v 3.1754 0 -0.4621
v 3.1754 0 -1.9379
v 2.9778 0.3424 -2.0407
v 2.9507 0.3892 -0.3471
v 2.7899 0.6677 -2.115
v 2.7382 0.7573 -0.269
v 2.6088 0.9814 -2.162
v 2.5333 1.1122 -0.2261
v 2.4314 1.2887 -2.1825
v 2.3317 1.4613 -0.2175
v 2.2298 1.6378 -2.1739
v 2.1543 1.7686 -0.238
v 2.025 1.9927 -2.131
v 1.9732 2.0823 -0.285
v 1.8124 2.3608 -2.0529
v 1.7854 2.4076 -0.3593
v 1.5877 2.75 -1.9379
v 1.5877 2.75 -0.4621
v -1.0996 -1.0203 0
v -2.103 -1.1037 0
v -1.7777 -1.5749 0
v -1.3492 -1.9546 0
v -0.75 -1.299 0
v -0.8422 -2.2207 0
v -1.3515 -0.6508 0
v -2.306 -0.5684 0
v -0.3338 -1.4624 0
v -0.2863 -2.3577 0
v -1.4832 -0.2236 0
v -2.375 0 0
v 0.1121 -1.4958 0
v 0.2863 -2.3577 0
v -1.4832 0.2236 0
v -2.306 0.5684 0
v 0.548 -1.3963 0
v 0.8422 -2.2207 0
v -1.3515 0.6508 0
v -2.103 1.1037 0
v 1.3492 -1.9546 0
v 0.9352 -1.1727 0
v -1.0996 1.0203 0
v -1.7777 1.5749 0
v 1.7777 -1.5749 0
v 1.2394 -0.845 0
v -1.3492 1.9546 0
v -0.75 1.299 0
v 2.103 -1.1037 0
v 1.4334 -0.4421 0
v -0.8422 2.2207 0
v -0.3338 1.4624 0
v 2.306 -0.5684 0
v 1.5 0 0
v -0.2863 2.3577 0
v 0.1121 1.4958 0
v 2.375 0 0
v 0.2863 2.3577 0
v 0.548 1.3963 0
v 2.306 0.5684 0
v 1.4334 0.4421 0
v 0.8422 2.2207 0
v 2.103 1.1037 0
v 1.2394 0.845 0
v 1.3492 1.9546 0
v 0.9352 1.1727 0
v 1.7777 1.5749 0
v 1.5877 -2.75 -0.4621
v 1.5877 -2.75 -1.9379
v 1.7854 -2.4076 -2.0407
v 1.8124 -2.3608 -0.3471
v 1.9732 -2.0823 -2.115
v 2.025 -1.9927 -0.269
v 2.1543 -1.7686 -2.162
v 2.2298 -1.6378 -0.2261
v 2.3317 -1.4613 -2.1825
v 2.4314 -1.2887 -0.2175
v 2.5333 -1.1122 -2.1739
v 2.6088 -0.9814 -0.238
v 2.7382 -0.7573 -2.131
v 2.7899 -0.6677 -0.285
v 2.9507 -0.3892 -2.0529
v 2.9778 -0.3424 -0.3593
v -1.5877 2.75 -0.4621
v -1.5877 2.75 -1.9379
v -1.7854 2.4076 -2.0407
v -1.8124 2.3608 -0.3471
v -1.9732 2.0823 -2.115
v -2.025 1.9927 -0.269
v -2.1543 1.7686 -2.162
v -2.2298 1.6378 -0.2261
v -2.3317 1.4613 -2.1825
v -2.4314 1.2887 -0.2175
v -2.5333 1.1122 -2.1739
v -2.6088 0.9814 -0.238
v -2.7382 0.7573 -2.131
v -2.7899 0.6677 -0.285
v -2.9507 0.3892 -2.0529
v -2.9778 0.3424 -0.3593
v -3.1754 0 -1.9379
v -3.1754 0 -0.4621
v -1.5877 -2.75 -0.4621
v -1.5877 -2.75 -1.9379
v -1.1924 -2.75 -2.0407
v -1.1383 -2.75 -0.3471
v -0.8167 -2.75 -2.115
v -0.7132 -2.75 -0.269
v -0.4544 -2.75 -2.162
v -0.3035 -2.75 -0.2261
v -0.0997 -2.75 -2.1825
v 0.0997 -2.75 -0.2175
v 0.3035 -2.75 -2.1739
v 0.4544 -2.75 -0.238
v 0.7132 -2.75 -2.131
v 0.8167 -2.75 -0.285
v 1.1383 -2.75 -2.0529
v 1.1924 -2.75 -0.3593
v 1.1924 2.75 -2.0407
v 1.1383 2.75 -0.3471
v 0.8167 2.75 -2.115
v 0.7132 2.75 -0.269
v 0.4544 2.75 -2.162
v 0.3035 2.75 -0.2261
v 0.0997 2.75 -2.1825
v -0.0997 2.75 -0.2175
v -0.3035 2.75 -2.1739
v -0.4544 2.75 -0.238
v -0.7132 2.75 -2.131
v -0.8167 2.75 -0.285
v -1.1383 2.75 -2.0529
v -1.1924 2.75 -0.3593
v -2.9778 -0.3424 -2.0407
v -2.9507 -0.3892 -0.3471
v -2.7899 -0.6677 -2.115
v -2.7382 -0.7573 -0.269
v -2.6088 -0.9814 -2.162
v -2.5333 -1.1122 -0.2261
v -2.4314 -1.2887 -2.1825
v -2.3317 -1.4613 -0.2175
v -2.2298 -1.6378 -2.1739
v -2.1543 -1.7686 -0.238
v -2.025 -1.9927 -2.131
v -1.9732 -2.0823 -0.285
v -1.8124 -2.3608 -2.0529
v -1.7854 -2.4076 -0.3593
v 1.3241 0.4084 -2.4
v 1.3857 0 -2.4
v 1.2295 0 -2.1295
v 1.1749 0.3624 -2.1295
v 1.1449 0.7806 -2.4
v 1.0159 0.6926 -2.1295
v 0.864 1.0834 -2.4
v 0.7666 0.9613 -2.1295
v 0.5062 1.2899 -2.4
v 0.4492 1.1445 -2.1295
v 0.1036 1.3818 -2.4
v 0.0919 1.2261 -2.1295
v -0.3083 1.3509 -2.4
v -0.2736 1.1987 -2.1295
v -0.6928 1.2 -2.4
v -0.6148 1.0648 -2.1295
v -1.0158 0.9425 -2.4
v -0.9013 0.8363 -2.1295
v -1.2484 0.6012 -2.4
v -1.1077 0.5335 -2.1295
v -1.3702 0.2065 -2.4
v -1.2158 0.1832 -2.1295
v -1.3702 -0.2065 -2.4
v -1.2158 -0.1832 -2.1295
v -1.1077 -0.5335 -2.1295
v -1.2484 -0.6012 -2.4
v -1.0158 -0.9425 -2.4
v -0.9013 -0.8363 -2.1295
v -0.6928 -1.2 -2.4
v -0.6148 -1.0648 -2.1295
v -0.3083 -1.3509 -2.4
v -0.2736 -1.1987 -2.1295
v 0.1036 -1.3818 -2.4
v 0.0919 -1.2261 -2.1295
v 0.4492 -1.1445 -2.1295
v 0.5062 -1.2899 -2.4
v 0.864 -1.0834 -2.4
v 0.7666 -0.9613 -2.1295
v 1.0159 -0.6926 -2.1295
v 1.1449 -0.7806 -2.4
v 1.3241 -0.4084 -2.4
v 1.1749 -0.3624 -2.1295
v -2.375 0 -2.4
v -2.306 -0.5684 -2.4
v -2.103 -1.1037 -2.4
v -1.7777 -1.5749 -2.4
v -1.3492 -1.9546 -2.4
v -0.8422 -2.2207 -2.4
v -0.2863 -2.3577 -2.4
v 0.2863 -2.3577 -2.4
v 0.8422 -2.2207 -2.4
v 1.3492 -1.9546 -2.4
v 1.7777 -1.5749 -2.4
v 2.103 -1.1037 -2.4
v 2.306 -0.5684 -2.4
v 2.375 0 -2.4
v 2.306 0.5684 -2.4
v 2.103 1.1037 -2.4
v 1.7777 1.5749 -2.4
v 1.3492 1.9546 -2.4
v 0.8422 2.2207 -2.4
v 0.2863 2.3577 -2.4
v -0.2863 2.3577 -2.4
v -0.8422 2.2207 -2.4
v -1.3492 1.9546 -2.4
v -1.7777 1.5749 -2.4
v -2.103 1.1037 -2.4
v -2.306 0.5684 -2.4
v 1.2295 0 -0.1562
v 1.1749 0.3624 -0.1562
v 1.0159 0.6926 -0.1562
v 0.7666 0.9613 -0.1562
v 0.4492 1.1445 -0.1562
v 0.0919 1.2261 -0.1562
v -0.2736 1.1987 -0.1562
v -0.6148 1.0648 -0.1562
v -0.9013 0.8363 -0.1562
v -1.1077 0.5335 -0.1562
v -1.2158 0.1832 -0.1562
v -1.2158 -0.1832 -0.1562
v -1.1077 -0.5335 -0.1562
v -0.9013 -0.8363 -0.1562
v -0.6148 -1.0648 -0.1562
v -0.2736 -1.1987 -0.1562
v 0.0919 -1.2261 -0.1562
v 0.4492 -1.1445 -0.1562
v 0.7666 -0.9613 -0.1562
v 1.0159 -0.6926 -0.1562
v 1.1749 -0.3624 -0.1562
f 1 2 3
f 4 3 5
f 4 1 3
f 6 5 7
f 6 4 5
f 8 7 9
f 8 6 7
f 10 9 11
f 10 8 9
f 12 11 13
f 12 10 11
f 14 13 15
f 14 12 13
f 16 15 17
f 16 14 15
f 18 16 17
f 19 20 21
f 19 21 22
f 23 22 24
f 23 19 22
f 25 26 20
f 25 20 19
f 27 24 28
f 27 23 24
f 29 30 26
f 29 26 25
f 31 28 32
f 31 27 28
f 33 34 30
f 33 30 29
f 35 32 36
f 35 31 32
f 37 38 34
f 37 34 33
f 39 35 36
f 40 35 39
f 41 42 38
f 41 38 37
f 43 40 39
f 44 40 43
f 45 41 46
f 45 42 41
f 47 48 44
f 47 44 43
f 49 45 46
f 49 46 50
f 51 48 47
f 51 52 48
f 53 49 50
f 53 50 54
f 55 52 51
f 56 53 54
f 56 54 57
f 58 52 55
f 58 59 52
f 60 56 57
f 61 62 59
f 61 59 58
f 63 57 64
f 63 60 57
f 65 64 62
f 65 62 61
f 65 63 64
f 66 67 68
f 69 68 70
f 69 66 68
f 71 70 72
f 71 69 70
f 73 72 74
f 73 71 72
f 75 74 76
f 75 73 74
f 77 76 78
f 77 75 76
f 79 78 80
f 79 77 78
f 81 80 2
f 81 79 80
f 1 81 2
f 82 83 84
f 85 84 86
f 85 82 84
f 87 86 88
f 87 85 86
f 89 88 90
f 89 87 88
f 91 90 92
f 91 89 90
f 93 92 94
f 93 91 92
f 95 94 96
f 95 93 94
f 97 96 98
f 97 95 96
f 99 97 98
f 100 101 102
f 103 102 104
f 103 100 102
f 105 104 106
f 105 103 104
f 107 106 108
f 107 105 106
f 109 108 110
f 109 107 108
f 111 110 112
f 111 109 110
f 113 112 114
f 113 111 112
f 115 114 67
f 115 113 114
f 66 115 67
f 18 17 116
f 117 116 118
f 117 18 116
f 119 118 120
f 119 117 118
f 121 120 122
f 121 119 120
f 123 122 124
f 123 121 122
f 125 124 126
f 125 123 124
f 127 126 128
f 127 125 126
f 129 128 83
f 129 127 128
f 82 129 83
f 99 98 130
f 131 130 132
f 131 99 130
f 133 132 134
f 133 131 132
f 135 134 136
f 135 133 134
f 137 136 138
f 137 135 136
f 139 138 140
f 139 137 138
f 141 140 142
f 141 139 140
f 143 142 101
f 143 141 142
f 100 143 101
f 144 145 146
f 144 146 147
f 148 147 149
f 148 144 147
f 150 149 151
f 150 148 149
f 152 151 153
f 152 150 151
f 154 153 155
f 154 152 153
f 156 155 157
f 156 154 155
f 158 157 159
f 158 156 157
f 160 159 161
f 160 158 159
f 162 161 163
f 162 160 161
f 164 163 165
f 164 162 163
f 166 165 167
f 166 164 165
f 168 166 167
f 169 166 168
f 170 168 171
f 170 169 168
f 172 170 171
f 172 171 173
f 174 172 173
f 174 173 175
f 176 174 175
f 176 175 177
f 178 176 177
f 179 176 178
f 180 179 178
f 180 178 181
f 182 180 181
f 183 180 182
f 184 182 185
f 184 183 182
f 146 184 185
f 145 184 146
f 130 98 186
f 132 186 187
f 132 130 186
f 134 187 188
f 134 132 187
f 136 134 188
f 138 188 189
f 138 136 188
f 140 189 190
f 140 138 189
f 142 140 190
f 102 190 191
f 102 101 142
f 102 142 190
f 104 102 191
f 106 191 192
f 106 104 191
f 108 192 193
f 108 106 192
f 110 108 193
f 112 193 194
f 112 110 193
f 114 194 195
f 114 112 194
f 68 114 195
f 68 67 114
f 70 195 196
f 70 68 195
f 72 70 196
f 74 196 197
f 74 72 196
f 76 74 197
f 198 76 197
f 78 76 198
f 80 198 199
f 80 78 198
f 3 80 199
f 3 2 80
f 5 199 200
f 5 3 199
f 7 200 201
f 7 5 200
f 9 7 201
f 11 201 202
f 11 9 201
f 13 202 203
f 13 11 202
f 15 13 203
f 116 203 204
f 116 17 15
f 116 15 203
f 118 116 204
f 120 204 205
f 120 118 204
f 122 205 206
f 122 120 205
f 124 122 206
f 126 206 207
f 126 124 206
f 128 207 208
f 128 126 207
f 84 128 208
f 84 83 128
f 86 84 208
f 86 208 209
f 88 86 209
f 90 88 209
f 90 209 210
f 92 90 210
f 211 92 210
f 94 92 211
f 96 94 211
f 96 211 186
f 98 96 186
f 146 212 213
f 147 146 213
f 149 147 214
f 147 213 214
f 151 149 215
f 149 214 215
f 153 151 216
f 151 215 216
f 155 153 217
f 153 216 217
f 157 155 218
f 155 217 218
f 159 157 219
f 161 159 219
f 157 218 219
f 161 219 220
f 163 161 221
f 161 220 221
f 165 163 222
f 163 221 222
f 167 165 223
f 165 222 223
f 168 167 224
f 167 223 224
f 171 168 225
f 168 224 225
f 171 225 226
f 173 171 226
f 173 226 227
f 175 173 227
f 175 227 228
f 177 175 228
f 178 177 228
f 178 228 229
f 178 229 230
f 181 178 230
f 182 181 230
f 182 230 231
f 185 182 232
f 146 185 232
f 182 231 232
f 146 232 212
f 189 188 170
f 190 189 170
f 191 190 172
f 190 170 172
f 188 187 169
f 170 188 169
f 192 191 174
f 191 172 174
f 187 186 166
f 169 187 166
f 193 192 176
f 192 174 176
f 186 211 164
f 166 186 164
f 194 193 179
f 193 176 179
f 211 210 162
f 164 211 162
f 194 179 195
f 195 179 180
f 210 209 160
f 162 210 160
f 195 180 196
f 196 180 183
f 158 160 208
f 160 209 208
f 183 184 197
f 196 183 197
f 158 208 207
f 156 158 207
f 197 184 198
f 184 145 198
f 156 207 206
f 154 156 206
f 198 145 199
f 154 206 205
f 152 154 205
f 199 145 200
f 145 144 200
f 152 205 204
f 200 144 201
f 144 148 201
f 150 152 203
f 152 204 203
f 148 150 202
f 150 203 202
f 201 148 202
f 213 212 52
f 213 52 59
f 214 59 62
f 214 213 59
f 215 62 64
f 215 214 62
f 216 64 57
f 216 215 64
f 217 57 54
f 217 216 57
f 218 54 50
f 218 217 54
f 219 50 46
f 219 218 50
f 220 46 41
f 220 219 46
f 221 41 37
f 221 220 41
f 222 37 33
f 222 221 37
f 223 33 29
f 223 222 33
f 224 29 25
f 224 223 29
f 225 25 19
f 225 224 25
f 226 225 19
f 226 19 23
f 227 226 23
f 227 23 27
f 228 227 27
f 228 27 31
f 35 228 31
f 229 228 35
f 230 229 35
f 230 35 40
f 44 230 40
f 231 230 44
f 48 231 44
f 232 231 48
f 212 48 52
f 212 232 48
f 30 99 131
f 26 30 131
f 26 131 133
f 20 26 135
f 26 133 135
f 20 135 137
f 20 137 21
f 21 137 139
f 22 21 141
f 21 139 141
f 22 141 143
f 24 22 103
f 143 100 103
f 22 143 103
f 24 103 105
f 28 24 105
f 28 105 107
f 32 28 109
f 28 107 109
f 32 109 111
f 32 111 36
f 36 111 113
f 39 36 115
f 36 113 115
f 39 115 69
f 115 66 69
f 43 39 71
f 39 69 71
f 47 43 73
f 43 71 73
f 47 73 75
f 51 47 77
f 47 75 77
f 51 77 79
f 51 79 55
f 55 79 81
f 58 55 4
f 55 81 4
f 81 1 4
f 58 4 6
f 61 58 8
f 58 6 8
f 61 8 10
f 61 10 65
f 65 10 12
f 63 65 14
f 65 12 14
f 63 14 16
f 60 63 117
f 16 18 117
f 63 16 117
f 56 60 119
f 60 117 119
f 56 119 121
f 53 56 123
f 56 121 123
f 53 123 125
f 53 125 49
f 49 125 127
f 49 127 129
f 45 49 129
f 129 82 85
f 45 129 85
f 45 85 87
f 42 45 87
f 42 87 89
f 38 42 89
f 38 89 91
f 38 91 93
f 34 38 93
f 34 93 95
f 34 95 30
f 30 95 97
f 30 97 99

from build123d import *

# Parameters (mm, degrees)
SKETCH1_R               = 1.2295
BASENUT_DEPTH           = 2.4
ENDCHAMFER_SIZE         = 0.2705
ENDCHAMFER_SIZE2        = 0.156173248
ENDCHAMFER_PART_2_SIZE  = 0.2705
ENDCHAMFER_PART_2_SIZE2 = 0.156173248


with BuildPart() as part:
    # Sketch1 → BaseNut (new body)
    with BuildSketch(Plane.XY):
        Polygon((3.175426481, 0), (1.58771324, 2.75), (-1.58771324, 2.75), (-3.175426481, 0), (-1.58771324, -2.75), (1.58771324, -2.75), align=None)
        Circle(SKETCH1_R, mode=Mode.SUBTRACT)
    extrude(amount=-BASENUT_DEPTH)

    # Sketch2 → Double-Chamfer (revolve, cut)
    with BuildSketch(Plane(origin=(0, 0, 0), x_dir=(1, 0, 0), z_dir=(0, 1, 0))):
        Polygon((-3.175426481, 2.4), (-2.375, 2.4), (-3.175426481, 1.937873556), align=None)
        Polygon((-3.175426481, 0.462126444), (-3.175426481, 0), (-2.375, 0), align=None)
    revolve(axis=Axis((0, 0, -3.375940562), (0, 0, 1)), mode=Mode.SUBTRACT)

    # EndChamfer
    endchamfer_edges = [part.edges().sort_by_distance(p)[0] for p in [
        (-1.2295, 0, -2.4),
    ]]
    endchamfer_side = [part.faces().sort_by_distance(p)[0] for p in [
        (-1.2295, 0, -1.2),
    ]]
    chamfer(endchamfer_edges, length=ENDCHAMFER_SIZE, length2=ENDCHAMFER_SIZE2, reference=endchamfer_side[0])

    # EndChamfer part 2
    endchamfer_part_2_edges = [part.edges().sort_by_distance(p)[0] for p in [
        (-1.2295, 0, 0),
    ]]
    endchamfer_part_2_side = [part.faces().sort_by_distance(p)[0] for p in [
        (2.307824856, 0, 0),
    ]]
    chamfer(endchamfer_part_2_edges, length=ENDCHAMFER_PART_2_SIZE, length2=ENDCHAMFER_PART_2_SIZE2, reference=endchamfer_part_2_side[0])


solid = part.part
